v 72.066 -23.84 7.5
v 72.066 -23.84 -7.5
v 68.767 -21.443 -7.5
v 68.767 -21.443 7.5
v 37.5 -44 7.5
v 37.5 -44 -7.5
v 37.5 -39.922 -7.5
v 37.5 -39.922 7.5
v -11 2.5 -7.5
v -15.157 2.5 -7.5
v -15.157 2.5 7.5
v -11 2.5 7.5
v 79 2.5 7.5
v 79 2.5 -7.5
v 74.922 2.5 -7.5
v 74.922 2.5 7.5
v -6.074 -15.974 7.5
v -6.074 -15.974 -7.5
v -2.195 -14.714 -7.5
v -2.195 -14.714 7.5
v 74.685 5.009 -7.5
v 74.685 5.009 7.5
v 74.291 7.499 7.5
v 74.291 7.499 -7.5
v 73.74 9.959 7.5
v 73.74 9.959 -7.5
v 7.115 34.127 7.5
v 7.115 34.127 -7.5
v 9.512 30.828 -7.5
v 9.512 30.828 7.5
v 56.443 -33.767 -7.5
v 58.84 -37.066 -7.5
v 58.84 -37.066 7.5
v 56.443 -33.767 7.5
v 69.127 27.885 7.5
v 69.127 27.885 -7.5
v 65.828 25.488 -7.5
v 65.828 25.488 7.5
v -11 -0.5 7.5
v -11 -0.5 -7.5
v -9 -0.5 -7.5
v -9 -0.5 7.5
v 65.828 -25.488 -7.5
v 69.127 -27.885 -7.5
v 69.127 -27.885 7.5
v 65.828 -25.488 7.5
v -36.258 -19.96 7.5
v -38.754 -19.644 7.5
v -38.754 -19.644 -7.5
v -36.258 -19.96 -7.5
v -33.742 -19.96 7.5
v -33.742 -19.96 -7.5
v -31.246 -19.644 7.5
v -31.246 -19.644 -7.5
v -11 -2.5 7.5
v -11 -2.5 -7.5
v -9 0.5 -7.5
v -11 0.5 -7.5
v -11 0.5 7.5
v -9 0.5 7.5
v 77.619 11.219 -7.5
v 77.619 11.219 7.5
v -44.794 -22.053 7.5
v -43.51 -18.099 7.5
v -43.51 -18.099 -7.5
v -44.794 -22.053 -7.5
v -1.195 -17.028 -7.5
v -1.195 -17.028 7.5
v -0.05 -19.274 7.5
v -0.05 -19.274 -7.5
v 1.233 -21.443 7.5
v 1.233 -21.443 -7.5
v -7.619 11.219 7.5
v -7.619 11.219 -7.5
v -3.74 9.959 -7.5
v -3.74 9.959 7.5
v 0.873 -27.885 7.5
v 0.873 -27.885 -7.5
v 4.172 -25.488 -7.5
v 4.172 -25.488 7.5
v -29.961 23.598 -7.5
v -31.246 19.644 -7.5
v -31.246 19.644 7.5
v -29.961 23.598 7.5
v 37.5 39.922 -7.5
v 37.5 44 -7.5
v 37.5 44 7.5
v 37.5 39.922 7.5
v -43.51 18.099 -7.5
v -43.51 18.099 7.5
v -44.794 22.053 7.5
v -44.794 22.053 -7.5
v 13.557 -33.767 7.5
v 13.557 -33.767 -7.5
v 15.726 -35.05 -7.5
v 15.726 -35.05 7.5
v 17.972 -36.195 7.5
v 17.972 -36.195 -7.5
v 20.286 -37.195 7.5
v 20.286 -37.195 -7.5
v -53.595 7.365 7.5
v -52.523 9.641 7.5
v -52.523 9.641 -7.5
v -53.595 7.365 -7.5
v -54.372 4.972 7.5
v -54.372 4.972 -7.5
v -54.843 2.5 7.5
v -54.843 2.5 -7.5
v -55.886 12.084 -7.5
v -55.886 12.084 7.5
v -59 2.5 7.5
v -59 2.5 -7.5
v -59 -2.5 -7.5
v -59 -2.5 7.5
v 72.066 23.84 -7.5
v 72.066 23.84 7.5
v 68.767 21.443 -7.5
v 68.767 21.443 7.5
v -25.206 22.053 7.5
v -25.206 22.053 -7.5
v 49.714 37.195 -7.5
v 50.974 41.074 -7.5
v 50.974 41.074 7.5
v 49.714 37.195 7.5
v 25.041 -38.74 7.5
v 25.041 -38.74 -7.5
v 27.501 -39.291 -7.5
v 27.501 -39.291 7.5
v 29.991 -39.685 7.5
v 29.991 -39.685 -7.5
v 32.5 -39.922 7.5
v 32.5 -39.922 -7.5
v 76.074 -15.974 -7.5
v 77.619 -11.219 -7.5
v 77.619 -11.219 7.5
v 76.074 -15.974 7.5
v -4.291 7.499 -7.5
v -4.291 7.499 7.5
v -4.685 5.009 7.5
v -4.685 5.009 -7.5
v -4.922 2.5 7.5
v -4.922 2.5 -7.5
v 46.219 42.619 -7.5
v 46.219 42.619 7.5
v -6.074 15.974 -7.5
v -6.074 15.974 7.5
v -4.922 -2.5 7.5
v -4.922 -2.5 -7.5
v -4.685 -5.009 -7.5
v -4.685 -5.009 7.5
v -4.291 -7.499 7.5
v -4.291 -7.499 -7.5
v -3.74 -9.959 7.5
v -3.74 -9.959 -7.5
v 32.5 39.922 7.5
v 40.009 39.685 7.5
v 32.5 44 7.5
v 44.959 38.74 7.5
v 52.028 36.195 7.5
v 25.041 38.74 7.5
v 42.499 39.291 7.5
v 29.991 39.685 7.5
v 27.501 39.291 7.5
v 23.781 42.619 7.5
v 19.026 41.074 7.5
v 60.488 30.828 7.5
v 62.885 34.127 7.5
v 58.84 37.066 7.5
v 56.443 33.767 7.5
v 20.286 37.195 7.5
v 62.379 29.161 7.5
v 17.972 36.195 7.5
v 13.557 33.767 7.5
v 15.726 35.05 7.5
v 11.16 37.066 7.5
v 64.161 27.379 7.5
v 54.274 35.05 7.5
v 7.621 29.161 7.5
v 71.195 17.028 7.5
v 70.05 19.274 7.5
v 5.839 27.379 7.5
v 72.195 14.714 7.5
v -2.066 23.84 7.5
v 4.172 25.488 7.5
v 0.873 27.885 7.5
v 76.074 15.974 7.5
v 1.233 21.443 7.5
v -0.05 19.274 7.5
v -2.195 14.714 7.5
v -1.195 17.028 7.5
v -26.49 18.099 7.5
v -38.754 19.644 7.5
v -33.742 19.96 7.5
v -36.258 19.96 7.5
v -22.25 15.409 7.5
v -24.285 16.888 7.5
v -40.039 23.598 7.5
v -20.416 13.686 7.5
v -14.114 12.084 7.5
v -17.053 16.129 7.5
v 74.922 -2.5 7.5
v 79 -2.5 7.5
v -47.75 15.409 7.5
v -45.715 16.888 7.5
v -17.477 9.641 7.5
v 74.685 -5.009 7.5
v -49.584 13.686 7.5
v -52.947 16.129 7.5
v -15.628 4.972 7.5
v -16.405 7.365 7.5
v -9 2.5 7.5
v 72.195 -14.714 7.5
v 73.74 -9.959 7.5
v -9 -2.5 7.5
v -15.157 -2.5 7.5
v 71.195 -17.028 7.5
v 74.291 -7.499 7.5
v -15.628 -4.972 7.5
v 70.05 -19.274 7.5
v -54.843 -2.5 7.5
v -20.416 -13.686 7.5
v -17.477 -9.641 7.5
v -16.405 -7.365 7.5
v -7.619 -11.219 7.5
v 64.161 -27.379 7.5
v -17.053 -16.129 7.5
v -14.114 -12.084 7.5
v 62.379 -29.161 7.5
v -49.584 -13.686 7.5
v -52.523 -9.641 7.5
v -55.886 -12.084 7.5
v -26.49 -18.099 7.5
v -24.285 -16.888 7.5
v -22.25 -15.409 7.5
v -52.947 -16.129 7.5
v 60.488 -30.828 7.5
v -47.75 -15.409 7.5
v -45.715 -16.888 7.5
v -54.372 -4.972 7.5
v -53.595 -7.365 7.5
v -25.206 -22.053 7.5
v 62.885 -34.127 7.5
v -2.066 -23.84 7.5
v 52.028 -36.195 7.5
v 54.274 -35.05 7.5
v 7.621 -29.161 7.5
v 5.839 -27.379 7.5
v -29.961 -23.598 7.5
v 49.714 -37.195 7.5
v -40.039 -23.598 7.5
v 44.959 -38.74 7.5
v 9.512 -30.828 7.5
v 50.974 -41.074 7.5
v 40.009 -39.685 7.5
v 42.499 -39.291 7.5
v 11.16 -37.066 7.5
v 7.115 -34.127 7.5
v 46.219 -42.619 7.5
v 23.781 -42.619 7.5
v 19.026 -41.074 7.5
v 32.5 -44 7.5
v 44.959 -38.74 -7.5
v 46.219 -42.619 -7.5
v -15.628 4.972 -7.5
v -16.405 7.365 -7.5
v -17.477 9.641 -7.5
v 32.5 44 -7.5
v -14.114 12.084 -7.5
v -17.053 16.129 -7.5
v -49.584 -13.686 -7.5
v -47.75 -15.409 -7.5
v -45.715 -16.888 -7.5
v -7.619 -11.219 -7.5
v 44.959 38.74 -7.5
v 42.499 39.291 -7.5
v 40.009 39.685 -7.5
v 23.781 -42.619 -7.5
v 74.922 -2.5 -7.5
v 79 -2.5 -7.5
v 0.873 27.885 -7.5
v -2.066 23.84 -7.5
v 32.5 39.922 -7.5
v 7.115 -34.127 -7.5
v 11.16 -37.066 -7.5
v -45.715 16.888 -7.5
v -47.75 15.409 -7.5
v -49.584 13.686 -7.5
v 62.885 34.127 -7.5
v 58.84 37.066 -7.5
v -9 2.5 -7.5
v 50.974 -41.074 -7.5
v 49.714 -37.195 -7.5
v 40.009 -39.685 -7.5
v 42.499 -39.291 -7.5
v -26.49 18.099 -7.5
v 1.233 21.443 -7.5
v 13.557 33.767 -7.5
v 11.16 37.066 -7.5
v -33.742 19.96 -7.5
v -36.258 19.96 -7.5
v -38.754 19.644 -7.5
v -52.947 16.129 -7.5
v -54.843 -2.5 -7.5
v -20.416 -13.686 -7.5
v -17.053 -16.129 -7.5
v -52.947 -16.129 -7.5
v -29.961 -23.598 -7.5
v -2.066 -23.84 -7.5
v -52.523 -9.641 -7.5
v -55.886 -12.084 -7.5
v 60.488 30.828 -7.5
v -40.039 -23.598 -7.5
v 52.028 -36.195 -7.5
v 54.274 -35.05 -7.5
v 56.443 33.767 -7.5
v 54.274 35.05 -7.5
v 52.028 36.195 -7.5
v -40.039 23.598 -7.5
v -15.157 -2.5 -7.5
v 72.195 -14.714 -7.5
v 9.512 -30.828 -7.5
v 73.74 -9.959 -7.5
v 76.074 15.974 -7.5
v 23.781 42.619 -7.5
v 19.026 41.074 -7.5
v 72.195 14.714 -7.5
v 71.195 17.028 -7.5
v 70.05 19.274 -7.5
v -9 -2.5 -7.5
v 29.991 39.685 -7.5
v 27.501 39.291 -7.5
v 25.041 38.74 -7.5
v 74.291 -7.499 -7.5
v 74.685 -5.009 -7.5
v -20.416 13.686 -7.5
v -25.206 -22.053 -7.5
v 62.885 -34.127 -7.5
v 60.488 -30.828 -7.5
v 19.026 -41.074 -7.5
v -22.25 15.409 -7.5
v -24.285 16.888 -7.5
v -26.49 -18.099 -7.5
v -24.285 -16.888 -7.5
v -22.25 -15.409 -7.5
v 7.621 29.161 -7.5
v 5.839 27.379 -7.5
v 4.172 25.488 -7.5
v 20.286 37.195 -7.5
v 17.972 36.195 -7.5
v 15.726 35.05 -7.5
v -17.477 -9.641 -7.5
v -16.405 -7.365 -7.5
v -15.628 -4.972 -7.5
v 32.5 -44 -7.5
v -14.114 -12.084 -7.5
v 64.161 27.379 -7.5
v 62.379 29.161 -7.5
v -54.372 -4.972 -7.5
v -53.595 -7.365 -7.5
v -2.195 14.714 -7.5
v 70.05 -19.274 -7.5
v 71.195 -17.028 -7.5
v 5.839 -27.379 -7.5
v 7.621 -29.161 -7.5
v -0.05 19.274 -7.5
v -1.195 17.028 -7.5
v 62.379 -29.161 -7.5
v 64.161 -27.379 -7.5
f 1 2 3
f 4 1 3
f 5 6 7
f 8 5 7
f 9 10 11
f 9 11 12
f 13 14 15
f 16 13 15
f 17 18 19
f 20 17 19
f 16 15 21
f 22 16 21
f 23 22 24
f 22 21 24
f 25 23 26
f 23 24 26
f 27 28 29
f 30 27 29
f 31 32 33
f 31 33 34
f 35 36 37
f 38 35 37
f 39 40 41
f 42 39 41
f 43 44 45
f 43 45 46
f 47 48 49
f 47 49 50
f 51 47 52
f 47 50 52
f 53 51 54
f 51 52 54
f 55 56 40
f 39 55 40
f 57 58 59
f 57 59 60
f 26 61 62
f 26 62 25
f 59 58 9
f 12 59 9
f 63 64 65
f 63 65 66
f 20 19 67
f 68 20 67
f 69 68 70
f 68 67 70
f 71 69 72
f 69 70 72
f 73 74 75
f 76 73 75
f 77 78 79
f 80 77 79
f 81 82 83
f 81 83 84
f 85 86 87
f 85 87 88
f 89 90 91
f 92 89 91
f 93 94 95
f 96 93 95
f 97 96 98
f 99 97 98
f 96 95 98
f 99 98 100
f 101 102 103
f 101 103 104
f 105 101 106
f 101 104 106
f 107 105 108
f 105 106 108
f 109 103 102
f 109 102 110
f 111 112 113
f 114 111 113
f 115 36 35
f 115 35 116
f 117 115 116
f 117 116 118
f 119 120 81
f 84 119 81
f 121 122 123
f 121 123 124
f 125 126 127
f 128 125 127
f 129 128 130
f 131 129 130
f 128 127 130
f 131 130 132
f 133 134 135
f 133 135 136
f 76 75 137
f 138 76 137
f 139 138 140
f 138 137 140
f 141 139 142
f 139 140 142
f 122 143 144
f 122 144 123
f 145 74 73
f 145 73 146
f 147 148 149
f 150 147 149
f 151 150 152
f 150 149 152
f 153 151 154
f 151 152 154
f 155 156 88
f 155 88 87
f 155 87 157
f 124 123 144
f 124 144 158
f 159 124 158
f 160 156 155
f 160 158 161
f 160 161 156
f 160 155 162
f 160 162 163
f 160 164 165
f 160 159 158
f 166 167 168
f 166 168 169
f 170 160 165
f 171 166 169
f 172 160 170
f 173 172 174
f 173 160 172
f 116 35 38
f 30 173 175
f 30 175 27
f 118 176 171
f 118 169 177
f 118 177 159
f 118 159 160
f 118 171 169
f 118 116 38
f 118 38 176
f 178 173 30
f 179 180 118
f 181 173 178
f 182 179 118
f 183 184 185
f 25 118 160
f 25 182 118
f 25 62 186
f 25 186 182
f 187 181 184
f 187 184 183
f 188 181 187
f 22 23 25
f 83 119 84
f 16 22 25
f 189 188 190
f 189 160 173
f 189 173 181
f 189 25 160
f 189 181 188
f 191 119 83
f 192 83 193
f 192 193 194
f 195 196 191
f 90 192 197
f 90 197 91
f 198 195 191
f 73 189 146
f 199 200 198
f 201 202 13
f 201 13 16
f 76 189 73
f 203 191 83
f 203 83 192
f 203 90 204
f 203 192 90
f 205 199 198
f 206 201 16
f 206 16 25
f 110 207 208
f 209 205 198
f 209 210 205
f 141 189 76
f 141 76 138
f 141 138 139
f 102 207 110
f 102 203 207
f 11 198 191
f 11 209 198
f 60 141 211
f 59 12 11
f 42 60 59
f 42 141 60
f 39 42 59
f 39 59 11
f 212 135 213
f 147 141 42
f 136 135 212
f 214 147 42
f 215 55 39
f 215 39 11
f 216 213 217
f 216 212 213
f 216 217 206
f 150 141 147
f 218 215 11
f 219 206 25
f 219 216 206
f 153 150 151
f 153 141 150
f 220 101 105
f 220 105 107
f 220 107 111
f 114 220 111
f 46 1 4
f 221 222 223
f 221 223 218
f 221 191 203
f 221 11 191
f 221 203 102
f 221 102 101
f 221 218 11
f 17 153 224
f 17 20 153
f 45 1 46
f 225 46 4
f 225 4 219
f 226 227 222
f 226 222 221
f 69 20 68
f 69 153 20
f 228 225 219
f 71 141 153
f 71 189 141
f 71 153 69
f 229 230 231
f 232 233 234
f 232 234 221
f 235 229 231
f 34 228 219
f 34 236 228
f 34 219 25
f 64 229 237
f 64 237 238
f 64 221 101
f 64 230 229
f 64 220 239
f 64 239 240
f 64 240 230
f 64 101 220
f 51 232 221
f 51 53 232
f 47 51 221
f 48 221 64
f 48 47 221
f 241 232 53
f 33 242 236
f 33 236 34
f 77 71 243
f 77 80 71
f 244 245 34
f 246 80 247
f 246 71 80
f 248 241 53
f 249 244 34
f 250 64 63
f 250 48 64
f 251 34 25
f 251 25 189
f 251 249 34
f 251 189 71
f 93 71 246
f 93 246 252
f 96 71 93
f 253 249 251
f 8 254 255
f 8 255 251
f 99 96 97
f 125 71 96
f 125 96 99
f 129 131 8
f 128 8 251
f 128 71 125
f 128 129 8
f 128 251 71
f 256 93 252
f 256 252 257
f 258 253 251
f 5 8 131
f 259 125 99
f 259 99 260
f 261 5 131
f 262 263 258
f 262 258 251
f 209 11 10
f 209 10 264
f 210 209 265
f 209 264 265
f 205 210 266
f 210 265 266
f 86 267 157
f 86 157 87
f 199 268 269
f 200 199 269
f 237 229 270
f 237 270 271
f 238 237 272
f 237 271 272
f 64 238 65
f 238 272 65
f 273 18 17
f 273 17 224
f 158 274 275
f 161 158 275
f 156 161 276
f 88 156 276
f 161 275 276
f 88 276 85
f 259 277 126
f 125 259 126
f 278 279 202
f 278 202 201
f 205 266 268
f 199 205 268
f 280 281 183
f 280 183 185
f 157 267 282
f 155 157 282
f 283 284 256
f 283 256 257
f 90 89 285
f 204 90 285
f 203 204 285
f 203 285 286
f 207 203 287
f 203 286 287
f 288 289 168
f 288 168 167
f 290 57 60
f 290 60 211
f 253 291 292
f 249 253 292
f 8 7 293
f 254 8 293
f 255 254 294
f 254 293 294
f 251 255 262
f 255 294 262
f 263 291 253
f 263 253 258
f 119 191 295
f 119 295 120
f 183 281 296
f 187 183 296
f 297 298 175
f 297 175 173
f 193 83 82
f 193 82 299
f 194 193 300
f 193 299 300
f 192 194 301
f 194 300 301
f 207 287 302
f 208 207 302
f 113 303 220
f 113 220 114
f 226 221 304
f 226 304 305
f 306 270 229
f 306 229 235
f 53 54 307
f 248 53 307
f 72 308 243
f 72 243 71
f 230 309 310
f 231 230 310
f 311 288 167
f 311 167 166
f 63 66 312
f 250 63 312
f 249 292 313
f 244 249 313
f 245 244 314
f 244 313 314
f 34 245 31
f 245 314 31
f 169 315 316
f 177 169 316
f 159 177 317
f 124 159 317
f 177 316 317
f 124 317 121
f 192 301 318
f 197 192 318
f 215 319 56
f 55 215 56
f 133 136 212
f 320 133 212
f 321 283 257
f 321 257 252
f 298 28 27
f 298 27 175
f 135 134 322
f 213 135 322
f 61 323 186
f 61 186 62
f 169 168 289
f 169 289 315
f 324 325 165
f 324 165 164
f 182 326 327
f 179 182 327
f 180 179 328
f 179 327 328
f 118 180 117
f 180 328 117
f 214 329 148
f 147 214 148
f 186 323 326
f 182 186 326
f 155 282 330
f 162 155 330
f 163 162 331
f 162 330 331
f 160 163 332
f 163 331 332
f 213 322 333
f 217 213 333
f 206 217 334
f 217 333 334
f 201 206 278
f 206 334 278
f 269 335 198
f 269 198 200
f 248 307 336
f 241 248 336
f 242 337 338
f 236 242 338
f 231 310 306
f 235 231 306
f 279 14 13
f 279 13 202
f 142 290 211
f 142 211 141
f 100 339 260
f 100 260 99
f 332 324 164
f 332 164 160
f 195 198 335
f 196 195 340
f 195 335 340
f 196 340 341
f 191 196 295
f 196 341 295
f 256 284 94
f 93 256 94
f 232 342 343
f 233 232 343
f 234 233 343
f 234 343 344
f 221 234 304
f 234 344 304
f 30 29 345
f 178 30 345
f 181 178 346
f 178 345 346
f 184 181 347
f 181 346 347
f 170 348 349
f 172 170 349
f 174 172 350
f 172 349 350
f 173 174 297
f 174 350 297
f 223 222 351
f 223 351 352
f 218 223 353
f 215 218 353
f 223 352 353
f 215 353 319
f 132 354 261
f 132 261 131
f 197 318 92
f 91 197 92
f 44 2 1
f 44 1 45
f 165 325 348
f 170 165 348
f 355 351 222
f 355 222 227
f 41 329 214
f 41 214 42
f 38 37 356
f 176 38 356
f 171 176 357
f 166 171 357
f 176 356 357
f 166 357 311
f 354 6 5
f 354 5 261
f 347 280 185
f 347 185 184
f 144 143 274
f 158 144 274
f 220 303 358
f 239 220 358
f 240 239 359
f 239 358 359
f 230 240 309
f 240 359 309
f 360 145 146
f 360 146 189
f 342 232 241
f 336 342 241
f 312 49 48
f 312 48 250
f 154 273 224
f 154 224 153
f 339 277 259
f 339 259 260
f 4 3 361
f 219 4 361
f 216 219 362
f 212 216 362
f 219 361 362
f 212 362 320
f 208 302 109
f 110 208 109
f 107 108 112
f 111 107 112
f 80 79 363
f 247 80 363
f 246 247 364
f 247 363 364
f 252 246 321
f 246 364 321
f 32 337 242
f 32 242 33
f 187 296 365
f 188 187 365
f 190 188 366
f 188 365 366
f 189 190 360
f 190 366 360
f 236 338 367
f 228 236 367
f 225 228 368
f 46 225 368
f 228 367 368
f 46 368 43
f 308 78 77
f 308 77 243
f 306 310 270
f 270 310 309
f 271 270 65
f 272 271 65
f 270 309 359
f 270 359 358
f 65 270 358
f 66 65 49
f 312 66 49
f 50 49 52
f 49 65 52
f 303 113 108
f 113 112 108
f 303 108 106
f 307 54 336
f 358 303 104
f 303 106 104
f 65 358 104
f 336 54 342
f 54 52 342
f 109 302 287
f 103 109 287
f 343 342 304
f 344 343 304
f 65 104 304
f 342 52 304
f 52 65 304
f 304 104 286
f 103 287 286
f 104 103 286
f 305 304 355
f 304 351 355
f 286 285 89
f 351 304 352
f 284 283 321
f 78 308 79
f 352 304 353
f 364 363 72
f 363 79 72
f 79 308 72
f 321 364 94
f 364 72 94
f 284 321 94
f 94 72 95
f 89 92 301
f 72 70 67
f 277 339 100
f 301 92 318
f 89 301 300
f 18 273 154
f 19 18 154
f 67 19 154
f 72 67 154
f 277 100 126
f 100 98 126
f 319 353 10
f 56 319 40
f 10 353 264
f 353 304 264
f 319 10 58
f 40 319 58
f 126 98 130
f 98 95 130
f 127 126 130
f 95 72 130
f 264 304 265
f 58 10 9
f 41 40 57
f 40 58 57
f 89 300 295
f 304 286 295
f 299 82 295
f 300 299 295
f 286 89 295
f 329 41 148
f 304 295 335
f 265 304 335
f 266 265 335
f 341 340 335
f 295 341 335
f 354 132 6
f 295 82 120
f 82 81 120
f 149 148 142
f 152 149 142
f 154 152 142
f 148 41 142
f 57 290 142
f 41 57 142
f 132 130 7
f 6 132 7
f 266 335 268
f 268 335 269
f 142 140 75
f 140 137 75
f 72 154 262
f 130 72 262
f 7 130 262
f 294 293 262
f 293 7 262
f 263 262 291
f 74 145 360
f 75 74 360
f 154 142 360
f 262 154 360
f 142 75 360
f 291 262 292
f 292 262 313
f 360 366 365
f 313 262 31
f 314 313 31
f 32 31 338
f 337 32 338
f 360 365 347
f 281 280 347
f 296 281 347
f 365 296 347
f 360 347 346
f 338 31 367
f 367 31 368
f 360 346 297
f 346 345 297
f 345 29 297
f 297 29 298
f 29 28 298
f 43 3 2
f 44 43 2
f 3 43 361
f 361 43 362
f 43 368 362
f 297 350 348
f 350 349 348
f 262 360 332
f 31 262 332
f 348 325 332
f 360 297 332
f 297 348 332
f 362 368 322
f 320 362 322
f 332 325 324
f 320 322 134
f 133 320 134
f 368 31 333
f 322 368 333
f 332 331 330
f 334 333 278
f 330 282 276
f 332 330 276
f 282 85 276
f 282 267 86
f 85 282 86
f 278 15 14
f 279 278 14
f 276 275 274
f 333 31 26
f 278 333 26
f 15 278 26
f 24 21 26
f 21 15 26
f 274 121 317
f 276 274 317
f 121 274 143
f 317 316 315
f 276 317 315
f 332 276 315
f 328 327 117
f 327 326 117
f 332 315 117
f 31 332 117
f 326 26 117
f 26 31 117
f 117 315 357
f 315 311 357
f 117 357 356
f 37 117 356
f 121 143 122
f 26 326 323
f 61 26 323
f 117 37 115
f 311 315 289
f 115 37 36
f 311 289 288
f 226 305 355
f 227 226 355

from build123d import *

# Parameters (mm, degrees)
SKETCH_2_R               = 20
EXTRUDE_2_DEPTH          = 15
SKETCH_7_R               = 40
EXTRUDE_4_DEPTH          = 15
SKETCH_9_W               = 5
SKETCH_9_H               = 5
EXTRUDE_6_DEPTH          = 15
PATTERN_CIRCULAR_1_COUNT = 10
SKETCH_17_W              = 5
SKETCH_17_H              = 5
EXTRUDE_9_DEPTH          = 15
PATTERN_CIRCULAR_3_COUNT = 20
SKETCH_18_W              = 3
SKETCH_18_H              = 1
EXTRUDE_10_DEPTH         = 15


with BuildPart() as part:
    # 草图2 → 凸台-拉伸2 (new body)
    with BuildSketch(Plane.XY.offset(-7.5)):
        with Locations((-35, 0)):
            Circle(SKETCH_2_R)
    extrude(amount=EXTRUDE_2_DEPTH)

    # 草图9 → 凸台-拉伸6 (add)
    with BuildSketch(Plane.XY.offset(-7.5)):
        with Locations((-13.5, 0)):
            Rectangle(SKETCH_9_W, SKETCH_9_H)
    extrude_6 = extrude(amount=EXTRUDE_6_DEPTH)

    # 阵列(圆周)1: 凸台-拉伸6 ×10 about axis
    pattern_circular_1_axis = Axis((-35, 0, 8.25), (0, 0, -1))
    for i in range(1, PATTERN_CIRCULAR_1_COUNT):
        add(extrude_6.rotate(pattern_circular_1_axis, i * 360 / PATTERN_CIRCULAR_1_COUNT))



with BuildPart() as body_2:
    # 草图7 → 凸台-拉伸4 (new body)
    with BuildSketch(Plane.XY.offset(-7.5)):
        with Locations((35, 0)):
            Circle(SKETCH_7_R)
    extrude(amount=EXTRUDE_4_DEPTH)

    # 草图17 → 凸台-拉伸9 (add)
    with BuildSketch(Plane.XY.offset(-7.5)):
        with Locations((-6.5, 0)):
            Rectangle(SKETCH_17_W, SKETCH_17_H)
    extrude_9 = extrude(amount=EXTRUDE_9_DEPTH)

    # 阵列(圆周)3: 凸台-拉伸9 ×20 about axis
    pattern_circular_3_axis = Axis((35, 0, 8.25), (0, 0, -1))
    for i in range(1, PATTERN_CIRCULAR_3_COUNT):
        add(extrude_9.rotate(pattern_circular_3_axis, i * 360 / PATTERN_CIRCULAR_3_COUNT))


with BuildPart() as part_1:
    add(part.part)

    add(body_2.part)  # 凸台-拉伸10 merges body 2
    # 草图18 → 凸台-拉伸10 (add)
    with BuildSketch(Plane.XY.offset(-7.5)):
        with Locations((-10, 0)):
            Rectangle(SKETCH_18_W, SKETCH_18_H)
    extrude(amount=EXTRUDE_10_DEPTH)


solid = part_1.part
